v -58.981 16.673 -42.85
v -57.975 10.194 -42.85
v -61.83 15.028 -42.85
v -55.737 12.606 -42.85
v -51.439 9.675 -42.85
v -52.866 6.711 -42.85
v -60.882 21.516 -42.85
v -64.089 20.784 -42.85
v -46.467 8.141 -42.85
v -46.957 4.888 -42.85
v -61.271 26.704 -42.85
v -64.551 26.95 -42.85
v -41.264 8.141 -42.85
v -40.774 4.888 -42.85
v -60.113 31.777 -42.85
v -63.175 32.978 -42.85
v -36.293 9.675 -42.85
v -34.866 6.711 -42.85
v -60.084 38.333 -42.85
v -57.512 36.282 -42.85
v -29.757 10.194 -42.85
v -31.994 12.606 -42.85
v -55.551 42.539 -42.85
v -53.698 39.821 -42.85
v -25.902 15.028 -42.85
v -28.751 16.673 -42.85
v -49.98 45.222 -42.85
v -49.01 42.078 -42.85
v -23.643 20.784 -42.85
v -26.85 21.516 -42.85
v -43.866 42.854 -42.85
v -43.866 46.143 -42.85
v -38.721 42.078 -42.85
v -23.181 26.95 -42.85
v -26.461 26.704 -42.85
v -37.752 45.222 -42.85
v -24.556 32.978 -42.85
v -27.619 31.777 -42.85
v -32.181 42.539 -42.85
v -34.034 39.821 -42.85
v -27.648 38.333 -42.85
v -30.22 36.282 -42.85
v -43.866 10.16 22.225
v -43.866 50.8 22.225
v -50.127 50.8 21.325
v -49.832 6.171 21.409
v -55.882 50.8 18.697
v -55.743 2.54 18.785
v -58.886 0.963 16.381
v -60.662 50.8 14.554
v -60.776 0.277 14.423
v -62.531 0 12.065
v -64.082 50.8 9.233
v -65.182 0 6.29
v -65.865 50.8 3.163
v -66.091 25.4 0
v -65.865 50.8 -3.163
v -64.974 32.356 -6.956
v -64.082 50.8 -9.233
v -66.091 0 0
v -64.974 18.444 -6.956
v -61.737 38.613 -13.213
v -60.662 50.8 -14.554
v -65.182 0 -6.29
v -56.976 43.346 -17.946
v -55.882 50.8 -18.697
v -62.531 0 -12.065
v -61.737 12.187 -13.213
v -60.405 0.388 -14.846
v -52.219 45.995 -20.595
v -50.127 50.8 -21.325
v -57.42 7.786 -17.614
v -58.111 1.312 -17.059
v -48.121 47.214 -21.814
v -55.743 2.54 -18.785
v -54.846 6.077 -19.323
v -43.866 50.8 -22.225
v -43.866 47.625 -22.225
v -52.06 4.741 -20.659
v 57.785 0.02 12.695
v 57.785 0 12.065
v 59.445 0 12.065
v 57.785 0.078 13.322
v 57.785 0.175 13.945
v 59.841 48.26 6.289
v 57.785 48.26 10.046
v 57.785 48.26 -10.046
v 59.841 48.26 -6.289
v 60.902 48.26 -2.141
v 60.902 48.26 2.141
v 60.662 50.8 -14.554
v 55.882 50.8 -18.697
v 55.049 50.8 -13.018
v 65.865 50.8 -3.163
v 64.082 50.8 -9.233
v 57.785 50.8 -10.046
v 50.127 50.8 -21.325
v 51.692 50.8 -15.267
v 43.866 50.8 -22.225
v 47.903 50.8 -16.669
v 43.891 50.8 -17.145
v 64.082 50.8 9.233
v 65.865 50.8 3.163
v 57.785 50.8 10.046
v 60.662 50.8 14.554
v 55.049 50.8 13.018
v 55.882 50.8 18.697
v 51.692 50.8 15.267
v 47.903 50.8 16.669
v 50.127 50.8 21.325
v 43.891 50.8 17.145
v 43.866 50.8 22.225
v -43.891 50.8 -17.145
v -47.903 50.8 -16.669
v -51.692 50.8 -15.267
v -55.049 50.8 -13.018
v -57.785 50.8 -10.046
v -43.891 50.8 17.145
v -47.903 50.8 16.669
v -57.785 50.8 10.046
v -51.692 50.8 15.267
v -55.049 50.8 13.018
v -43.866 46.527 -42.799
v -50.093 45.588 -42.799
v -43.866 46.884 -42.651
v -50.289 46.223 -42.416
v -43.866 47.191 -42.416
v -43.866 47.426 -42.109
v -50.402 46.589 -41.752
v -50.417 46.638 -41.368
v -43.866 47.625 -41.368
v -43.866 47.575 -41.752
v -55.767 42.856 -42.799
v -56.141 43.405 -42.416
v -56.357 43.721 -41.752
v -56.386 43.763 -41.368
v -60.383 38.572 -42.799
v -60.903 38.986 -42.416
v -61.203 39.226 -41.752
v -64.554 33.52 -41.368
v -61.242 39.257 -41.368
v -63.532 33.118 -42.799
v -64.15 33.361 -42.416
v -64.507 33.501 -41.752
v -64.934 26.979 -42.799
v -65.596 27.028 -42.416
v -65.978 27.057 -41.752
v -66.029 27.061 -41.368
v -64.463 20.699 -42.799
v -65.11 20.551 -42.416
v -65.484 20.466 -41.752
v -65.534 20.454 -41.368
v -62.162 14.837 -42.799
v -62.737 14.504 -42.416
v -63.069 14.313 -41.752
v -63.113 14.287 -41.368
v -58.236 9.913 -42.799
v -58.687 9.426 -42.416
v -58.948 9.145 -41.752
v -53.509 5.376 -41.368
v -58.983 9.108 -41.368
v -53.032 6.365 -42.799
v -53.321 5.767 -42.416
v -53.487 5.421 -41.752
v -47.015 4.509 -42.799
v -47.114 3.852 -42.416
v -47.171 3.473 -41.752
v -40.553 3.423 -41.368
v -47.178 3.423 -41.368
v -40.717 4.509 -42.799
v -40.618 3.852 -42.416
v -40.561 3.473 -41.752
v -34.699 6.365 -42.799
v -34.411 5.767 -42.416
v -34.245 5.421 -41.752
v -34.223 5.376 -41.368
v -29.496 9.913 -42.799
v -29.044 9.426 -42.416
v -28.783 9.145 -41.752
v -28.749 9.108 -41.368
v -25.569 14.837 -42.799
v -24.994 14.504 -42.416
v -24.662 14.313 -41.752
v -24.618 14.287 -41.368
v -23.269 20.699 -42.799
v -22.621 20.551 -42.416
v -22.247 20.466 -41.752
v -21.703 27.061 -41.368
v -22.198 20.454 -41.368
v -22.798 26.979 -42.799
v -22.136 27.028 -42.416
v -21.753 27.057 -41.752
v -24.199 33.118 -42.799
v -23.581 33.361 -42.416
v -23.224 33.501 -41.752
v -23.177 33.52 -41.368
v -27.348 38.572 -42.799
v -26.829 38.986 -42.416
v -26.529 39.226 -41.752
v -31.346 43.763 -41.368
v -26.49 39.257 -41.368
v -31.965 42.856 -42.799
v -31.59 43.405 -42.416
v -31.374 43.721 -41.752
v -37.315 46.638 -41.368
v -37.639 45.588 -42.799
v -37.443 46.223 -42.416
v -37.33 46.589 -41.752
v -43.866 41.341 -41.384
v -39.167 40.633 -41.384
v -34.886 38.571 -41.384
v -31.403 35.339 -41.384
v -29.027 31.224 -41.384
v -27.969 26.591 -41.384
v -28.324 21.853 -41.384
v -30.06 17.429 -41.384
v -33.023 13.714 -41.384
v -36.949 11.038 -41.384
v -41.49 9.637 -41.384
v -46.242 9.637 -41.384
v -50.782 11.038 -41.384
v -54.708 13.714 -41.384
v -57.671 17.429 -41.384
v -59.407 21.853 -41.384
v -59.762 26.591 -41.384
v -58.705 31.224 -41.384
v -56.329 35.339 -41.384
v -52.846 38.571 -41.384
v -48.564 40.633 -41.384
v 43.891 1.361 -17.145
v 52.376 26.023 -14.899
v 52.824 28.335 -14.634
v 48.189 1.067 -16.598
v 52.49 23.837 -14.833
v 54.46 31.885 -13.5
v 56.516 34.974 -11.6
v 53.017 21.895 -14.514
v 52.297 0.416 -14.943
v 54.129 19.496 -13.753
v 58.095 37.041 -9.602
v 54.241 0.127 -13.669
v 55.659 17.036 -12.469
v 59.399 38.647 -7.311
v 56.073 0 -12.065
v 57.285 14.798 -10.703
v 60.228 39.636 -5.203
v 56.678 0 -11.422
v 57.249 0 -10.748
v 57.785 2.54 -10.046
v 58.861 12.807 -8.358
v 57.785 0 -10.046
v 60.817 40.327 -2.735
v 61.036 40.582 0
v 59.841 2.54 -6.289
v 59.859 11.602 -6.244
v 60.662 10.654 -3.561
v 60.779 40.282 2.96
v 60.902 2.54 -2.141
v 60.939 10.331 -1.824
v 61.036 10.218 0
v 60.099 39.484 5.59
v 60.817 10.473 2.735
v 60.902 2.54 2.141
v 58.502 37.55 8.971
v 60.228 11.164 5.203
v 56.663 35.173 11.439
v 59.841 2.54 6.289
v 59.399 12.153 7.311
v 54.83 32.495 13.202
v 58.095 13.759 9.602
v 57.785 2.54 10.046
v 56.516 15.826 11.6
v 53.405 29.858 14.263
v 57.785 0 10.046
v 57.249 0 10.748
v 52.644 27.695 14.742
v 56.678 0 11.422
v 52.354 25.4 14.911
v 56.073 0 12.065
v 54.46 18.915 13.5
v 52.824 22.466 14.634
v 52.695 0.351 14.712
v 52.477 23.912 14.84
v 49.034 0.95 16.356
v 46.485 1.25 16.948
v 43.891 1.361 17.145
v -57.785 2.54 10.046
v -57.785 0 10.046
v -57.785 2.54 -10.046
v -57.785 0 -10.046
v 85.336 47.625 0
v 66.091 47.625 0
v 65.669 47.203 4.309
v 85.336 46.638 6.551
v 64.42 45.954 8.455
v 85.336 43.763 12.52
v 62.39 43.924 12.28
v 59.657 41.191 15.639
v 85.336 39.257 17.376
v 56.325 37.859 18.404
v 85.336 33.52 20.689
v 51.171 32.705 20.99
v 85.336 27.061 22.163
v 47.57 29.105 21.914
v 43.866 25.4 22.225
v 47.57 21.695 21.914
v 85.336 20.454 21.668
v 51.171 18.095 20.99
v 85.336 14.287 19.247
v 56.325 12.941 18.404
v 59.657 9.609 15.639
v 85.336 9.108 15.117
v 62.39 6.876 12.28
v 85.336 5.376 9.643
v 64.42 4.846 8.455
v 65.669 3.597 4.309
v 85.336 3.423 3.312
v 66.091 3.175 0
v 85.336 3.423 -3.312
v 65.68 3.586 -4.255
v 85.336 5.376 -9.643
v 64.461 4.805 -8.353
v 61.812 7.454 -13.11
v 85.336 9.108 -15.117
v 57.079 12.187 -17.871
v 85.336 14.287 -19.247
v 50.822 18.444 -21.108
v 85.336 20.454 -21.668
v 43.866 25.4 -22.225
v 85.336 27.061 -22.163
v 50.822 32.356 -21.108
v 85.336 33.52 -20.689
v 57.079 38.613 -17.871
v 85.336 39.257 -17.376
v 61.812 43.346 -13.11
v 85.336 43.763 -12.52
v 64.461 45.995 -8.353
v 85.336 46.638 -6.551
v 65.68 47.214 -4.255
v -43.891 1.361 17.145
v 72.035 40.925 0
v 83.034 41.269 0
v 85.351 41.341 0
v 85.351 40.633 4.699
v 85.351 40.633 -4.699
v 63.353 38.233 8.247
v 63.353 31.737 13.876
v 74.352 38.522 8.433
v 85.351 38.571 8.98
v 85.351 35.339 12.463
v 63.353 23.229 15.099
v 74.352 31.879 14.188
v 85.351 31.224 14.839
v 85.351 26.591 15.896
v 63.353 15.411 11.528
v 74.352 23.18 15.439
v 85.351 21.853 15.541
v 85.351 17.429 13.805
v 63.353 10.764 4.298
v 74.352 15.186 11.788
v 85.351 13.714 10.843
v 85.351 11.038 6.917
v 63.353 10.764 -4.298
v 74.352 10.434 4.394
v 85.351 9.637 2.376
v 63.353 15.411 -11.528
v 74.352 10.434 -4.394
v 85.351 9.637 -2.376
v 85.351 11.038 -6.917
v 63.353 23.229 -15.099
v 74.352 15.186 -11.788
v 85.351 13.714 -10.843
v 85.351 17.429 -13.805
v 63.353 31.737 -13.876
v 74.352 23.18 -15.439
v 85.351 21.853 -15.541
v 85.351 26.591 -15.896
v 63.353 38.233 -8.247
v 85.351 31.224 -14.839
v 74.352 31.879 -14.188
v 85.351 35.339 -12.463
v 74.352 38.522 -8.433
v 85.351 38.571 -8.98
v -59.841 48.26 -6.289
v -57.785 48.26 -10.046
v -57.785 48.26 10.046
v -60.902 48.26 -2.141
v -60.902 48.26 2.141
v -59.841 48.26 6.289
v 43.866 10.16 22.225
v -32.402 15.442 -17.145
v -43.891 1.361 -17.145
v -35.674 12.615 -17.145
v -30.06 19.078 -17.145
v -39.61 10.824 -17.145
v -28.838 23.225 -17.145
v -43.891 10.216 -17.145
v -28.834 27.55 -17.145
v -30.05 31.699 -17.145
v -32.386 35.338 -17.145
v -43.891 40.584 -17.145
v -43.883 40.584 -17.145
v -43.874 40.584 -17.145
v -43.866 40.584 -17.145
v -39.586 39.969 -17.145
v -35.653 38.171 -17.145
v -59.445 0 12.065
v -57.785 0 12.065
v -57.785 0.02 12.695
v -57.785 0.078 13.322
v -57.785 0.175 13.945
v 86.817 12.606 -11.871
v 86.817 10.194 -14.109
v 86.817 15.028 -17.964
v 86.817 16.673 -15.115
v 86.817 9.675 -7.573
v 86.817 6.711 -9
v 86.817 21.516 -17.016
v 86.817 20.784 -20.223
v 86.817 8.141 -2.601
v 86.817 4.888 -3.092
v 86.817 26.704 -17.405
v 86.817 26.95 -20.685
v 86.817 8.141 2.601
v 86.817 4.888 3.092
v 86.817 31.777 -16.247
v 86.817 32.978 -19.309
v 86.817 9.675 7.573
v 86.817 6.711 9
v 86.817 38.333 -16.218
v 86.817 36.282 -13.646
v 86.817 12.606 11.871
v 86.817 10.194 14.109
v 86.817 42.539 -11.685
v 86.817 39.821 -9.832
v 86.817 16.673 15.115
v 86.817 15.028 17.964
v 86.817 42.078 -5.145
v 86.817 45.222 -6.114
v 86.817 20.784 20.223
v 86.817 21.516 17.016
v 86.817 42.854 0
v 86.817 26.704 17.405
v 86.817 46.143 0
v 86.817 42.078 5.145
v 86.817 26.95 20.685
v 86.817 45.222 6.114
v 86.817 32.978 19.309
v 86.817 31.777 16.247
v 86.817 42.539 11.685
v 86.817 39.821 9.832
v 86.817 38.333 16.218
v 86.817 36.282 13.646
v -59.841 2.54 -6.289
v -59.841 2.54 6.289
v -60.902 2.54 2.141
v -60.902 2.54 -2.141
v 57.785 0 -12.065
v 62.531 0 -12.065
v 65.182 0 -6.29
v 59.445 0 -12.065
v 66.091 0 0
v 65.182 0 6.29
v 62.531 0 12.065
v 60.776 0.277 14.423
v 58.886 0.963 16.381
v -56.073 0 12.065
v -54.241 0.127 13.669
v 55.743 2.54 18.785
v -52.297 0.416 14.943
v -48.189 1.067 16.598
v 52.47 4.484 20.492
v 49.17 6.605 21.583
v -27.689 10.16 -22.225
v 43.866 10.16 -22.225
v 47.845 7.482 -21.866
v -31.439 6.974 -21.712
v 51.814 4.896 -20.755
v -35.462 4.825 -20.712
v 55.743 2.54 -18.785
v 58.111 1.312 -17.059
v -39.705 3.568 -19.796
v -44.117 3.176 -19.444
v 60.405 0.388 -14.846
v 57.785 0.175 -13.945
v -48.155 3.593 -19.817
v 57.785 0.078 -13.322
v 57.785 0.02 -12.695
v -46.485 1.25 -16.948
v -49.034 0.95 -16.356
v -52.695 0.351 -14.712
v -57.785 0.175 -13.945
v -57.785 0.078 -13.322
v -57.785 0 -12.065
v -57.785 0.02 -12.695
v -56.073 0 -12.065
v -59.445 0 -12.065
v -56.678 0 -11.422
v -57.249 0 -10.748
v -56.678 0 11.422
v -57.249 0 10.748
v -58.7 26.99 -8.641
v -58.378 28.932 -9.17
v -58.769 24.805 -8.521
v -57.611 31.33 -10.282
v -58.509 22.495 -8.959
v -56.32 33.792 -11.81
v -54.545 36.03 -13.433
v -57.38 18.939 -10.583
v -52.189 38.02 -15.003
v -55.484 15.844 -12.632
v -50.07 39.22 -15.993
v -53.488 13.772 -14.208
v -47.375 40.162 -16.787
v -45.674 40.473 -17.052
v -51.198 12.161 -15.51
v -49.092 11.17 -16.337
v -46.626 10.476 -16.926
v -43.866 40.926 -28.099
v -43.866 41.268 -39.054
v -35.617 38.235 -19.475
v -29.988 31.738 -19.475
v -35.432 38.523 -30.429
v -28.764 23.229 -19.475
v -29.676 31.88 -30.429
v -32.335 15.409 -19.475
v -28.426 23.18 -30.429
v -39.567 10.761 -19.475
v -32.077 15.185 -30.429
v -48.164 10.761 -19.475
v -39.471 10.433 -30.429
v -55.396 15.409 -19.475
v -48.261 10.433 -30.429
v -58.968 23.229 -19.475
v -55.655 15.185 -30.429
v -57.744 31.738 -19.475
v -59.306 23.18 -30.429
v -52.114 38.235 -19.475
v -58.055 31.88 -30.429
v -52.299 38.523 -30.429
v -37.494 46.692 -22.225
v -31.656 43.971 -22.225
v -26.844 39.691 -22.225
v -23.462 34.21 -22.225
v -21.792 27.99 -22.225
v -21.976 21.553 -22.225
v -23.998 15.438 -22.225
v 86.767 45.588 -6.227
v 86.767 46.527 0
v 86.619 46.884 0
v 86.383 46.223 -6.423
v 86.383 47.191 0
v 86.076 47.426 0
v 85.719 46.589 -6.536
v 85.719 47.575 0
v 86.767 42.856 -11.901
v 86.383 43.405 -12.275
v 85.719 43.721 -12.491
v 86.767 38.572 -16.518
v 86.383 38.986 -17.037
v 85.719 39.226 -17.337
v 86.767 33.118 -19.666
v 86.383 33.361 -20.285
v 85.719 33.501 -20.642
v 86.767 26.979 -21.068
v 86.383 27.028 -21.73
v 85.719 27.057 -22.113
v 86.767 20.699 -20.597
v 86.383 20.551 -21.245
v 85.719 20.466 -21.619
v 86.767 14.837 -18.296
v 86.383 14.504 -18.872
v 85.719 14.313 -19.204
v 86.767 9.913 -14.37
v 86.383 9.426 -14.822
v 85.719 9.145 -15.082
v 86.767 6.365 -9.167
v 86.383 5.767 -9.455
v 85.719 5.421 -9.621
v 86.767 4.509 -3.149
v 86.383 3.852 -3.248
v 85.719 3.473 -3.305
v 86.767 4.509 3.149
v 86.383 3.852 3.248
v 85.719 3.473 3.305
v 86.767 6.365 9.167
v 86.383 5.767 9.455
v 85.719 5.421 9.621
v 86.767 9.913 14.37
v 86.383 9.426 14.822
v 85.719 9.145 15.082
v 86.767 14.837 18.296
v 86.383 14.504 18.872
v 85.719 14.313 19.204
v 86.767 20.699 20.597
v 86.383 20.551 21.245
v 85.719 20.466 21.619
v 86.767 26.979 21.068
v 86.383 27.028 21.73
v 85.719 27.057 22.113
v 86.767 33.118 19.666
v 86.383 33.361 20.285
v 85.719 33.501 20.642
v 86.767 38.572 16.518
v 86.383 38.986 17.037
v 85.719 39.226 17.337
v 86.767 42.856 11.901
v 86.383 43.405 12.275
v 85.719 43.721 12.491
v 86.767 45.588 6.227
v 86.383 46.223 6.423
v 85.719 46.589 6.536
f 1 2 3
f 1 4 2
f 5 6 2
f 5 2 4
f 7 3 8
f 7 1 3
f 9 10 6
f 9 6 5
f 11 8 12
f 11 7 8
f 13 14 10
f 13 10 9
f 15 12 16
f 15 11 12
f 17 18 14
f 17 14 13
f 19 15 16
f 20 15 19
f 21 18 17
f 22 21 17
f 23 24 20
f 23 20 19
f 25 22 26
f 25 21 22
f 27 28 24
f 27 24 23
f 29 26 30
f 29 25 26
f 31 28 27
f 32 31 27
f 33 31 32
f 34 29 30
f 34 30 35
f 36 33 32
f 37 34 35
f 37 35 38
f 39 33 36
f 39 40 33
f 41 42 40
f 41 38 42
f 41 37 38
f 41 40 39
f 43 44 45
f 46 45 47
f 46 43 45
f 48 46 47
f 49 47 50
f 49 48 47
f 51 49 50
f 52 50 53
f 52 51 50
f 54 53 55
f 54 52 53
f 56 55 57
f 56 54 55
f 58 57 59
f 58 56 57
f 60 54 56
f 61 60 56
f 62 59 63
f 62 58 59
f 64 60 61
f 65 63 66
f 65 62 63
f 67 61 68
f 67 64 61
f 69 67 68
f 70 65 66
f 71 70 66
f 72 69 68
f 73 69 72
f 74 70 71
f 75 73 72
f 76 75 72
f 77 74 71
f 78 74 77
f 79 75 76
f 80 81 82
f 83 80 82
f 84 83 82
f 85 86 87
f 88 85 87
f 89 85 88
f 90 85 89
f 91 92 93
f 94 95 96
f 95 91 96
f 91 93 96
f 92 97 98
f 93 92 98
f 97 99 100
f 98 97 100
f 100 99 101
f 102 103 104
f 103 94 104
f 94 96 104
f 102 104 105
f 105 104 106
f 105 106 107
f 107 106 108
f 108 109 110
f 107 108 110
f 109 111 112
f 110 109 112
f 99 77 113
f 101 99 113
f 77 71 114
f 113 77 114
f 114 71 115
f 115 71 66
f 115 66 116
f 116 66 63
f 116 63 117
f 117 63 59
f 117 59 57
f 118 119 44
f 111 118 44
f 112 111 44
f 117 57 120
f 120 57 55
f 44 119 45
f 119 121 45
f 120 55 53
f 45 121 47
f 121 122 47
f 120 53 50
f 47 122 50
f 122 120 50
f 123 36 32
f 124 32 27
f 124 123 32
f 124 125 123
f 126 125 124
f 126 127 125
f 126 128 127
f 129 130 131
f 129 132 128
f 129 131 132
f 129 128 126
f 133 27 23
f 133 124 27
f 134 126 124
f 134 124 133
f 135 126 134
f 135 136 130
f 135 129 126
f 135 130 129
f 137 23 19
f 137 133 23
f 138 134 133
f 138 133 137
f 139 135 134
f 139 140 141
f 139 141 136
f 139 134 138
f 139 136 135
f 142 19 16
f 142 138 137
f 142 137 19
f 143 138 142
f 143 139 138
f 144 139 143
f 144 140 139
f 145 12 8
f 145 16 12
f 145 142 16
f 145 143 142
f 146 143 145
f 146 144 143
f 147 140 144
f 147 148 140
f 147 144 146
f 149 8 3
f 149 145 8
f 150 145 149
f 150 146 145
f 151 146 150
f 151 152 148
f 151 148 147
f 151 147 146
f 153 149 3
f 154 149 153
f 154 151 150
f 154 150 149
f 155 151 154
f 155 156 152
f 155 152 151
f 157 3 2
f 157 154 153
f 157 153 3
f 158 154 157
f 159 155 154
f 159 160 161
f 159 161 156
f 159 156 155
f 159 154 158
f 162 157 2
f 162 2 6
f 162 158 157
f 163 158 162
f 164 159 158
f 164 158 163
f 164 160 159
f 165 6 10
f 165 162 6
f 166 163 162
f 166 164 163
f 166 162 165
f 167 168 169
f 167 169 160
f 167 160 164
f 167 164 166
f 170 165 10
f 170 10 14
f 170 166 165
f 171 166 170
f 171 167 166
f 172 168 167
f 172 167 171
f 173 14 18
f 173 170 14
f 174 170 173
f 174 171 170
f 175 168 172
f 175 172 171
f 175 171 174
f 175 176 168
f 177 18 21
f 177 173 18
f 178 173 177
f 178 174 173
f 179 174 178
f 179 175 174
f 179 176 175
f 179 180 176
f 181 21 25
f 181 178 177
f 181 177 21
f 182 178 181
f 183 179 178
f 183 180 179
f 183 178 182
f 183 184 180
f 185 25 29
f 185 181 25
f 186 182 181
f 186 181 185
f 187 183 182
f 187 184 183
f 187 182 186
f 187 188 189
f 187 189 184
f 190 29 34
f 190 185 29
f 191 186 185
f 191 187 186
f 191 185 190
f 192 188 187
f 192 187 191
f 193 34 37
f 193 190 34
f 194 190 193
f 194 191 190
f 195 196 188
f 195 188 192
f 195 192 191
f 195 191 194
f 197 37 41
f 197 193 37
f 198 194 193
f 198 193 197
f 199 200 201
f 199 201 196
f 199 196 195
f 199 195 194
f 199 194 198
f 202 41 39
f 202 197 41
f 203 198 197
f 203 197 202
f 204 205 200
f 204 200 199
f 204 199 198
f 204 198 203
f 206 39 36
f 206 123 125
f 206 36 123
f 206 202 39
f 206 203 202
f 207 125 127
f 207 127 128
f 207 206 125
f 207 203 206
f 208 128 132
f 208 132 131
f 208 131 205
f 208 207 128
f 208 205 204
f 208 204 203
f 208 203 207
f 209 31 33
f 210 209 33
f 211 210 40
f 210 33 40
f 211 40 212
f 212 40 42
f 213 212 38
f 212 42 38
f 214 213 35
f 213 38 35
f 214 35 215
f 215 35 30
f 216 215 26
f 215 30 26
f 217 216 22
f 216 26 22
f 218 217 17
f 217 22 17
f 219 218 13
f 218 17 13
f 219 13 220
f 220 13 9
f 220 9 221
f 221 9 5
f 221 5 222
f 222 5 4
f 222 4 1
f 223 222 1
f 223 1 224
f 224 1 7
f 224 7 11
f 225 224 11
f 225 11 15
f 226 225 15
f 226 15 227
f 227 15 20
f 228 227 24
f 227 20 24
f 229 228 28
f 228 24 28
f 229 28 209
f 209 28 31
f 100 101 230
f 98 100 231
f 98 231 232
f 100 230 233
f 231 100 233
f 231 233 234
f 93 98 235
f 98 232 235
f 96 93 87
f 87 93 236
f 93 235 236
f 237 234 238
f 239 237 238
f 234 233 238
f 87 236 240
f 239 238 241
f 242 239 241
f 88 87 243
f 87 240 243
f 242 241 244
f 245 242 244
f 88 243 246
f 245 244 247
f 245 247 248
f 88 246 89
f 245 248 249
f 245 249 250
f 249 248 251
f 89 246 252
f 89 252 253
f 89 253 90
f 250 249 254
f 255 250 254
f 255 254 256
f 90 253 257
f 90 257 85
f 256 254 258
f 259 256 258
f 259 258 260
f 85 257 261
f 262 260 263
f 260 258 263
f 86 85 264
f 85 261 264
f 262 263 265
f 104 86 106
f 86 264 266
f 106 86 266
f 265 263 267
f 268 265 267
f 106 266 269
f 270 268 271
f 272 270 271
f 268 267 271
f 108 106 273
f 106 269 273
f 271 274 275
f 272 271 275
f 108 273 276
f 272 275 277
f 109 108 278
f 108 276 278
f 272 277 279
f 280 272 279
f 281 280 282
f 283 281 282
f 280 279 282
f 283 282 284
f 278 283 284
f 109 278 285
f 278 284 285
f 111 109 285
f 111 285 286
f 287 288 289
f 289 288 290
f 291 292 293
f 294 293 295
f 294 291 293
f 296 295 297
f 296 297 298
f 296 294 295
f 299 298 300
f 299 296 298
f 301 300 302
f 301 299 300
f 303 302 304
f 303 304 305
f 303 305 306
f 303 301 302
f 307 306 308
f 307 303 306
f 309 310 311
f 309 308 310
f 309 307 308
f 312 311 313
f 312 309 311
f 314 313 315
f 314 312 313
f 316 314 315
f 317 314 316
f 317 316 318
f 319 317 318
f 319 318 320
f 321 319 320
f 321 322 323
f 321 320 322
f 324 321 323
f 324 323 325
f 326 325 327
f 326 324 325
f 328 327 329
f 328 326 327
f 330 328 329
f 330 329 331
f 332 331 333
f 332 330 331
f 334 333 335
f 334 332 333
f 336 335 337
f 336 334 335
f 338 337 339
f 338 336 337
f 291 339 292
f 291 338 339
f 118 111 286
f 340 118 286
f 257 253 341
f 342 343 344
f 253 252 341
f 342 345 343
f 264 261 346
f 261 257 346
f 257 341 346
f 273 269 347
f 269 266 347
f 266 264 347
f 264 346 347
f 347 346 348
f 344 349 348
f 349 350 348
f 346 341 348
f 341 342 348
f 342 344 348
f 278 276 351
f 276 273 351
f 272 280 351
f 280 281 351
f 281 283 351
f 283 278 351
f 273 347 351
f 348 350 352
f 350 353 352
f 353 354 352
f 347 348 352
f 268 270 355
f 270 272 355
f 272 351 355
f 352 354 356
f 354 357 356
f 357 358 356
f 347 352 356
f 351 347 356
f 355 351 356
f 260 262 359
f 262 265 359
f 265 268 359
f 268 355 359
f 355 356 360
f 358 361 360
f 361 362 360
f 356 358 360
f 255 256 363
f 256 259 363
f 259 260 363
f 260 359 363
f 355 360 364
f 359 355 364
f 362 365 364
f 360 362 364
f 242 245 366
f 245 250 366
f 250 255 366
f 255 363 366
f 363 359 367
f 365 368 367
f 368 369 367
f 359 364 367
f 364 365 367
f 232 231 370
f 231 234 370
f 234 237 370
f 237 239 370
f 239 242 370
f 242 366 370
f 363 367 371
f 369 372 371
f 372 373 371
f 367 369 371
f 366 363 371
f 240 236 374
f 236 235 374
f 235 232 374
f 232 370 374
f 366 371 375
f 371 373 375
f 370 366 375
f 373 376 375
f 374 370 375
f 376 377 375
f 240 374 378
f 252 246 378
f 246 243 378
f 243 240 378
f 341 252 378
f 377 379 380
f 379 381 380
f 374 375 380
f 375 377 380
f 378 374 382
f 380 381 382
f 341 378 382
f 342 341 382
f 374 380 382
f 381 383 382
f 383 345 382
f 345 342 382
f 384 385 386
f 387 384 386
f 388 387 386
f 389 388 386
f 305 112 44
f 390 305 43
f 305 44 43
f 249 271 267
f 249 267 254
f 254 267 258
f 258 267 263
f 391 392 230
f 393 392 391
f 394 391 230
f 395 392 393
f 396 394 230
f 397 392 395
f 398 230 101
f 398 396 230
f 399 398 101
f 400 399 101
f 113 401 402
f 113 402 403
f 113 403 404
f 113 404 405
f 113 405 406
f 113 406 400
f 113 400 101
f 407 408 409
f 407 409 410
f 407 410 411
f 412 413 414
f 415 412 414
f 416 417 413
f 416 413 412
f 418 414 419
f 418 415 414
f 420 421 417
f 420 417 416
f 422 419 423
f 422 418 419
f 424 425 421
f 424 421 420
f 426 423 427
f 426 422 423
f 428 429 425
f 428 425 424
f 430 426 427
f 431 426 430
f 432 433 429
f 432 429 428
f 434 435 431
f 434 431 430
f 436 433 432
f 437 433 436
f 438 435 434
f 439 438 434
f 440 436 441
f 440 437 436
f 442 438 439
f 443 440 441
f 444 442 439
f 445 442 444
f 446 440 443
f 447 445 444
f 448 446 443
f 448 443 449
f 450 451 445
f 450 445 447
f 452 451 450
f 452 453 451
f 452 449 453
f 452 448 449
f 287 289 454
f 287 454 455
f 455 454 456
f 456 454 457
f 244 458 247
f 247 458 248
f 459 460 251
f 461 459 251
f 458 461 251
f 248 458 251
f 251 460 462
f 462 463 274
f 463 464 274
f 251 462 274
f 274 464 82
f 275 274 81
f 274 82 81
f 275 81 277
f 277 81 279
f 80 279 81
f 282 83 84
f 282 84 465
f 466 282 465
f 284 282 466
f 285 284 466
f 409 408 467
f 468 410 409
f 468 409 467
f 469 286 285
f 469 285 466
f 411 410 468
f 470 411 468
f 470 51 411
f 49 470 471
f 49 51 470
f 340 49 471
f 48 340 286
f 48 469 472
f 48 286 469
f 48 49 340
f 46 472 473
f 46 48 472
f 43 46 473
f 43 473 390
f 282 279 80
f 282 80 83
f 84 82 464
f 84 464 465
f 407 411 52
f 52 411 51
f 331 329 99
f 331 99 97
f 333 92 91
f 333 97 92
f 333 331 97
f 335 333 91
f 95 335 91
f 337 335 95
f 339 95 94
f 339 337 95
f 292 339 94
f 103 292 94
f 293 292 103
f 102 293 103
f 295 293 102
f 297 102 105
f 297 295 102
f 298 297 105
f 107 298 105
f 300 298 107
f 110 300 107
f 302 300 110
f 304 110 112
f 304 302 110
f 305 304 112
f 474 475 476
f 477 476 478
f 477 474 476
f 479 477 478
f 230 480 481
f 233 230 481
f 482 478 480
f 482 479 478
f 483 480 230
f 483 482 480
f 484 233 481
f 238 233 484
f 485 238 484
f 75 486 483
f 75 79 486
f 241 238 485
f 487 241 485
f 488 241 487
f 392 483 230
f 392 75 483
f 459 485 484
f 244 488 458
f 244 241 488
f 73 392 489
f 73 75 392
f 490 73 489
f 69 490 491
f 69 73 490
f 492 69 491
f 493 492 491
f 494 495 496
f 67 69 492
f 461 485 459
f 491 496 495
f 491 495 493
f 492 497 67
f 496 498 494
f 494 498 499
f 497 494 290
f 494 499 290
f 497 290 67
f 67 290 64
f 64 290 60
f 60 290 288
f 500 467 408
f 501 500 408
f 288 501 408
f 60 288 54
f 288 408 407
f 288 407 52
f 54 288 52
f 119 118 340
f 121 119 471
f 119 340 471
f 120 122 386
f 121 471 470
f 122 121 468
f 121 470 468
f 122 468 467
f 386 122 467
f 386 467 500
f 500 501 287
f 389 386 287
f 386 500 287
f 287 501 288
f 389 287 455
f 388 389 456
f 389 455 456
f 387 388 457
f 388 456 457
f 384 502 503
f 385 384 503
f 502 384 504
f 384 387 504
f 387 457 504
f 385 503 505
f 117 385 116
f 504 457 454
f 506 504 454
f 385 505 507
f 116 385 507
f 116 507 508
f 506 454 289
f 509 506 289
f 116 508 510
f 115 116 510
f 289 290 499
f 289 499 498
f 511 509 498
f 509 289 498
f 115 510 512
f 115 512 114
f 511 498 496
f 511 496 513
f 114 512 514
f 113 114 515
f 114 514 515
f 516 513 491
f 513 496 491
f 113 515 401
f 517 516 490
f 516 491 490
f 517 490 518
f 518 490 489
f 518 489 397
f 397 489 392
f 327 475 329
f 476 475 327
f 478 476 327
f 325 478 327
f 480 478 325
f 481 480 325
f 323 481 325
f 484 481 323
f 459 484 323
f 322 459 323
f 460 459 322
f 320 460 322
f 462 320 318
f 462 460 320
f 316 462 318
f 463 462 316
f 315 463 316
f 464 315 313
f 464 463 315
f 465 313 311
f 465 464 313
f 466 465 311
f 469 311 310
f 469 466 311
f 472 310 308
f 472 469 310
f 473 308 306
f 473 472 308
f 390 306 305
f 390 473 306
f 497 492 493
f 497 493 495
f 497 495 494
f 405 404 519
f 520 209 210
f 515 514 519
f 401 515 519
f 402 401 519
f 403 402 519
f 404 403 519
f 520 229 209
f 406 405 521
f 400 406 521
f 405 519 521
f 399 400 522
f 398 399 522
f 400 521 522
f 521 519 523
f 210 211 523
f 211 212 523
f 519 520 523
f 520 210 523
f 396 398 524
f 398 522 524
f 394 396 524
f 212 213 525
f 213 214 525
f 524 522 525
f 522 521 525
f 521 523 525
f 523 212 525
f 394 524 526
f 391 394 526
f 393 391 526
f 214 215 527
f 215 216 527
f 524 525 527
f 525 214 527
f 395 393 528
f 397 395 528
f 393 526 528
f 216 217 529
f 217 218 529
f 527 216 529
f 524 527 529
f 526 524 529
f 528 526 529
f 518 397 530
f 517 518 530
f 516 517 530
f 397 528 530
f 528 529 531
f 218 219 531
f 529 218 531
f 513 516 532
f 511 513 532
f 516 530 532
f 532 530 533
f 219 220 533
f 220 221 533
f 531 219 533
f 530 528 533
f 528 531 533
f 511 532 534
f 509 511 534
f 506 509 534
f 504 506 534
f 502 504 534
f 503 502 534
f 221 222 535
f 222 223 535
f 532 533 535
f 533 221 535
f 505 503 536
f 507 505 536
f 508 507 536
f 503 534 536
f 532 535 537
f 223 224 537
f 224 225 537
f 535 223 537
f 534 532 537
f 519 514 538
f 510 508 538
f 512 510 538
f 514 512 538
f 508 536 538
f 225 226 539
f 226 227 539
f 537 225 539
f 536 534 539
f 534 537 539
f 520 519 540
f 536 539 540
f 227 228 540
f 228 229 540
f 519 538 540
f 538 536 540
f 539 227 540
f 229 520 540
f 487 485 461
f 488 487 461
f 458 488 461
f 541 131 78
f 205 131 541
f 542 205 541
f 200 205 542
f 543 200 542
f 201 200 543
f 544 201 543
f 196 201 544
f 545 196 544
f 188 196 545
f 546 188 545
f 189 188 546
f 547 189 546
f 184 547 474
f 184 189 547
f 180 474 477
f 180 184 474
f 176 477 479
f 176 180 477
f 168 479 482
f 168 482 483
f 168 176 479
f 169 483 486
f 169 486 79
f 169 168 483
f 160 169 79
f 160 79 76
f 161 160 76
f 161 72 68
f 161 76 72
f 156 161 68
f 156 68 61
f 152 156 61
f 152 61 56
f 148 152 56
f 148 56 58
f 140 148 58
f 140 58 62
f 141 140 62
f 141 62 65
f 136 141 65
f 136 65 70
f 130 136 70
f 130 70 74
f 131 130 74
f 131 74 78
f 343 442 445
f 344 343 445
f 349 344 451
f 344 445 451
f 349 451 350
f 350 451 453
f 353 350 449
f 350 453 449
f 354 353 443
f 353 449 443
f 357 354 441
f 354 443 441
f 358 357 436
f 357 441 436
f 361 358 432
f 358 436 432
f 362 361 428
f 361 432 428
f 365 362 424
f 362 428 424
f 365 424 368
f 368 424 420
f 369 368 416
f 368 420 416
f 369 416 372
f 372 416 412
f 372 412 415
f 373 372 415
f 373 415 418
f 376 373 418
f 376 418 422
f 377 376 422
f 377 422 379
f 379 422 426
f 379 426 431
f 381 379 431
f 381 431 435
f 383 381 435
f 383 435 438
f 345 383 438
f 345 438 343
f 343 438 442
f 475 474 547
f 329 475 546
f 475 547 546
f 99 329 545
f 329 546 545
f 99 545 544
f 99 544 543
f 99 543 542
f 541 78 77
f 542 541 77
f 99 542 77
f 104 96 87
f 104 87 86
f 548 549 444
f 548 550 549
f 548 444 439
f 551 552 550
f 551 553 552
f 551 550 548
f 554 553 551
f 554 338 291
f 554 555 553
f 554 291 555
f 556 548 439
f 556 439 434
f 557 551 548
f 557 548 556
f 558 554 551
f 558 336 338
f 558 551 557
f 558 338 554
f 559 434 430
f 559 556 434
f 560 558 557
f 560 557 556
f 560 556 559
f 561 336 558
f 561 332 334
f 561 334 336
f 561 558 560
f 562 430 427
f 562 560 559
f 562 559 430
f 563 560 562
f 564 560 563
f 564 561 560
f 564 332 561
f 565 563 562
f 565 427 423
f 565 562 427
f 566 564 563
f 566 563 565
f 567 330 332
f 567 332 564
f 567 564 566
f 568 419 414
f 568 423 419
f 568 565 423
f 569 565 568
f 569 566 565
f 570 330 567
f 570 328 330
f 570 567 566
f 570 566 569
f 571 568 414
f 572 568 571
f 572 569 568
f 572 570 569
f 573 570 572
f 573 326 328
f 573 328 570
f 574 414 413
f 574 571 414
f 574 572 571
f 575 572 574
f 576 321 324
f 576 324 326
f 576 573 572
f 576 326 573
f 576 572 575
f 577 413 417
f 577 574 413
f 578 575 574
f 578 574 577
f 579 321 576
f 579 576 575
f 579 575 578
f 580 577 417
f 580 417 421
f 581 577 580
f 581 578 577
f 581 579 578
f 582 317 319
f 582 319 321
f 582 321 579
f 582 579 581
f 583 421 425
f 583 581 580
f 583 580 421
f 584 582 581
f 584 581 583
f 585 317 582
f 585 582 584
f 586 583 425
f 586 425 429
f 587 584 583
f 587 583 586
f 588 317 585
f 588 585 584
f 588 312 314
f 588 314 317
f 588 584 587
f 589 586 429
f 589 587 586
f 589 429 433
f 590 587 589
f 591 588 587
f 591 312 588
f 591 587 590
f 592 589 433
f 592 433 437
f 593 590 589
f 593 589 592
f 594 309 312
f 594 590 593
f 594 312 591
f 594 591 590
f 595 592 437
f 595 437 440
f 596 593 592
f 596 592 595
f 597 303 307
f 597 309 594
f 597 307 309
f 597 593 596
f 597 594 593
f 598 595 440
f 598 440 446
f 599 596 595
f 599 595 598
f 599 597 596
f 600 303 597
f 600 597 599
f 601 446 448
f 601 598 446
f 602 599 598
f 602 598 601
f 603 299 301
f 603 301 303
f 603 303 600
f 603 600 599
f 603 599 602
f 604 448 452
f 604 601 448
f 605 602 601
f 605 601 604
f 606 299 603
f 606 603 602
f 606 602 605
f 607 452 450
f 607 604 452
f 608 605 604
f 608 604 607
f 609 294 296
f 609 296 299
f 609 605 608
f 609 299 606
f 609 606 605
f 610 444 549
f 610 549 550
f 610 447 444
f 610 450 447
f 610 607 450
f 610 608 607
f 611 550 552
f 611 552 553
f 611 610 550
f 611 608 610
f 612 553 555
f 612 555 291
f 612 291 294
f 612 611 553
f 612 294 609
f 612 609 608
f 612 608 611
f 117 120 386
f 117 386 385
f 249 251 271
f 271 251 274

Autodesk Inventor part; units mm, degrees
ref_plane "YZ Plane" through (0, 0, 0) normal (1, 0, 0) x (0, 1, 0)
ref_plane "XZ Plane" through (0, 0, 0) normal (0, 1, 0) x (-1, 0, 0)
ref_plane "XY Plane" through (0, 0, 0) normal (0, 0, 1) x (1, 0, 0)
sketch "Sketch_1" plane through (0, 0, 0) normal (1, 0, 0) x (0, 1, 0)
  line L0 (50.8, 22.225) -> (10.16, 22.225)
  arc A0 (10.16, 22.225) -> (0, 12.065) centre (10.16, 12.065) ccw
  line L1 (0, 12.065) -> (0, -12.065)
  arc A1 (0, -12.065) -> (10.16, -22.225) centre (10.16, -12.065) ccw
  line L2 (10.16, -22.225) -> (50.8, -22.225)
  line L3 (50.8, -22.225) -> (50.8, 22.225)
extrude "Extrusion1" add sketch "Sketch_1" along normal mid plane 132.1816
sketch "Sketch_10" plane through (0, 0, 0) normal (0, 1, 0) x (-1, 0, 0)
  circle A0 centre (0, 0) radius 132.1816
  arc A1 (43.8658, -22.225) -> (43.8658, 22.225) centre (43.8658, 0) ccw
  line L0 (43.8658, 22.225) -> (-43.8658, 22.225)
  arc A2 (-43.8658, 22.225) -> (-43.8658, -22.225) centre (-43.8658, 0) ccw
  line L1 (-43.8658, -22.225) -> (43.8658, -22.225)
extrude "Extrusion2" cut sketch "Sketch_10" along normal blind 50.8
sketch "Sketch_7" plane through (0, 0, 0) normal (0, 0, 1) x (1, 0, 0)
  line L0 (86.8172, 25.4) -> (10.3632, 25.4)
  line L1 (10.3632, 25.4) -> (10.3632, 46.1433)
  arc A0 (11.8449, 47.625) -> (10.3632, 46.1433) centre (11.8449, 46.1433) ccw
  line L2 (11.8449, 47.625) -> (85.3355, 47.625)
  arc A1 (86.8172, 46.1433) -> (85.3355, 47.625) centre (85.3355, 46.1433) ccw
  line L3 (86.8172, 46.1433) -> (86.8172, 25.4)
  line L4 (86.8172, 25.4) -> (10.3632, 25.4)
revolve "Revolution1" add sketch "Sketch_7" angle 360 about axis through (86.8172, 25.4, 0) along (1, 0, 0)
sketch "Sketch_14" plane through (-43.8658, 0, 0) normal (1, 0, 0) x (0, 0, -1)
  line L0 (42.8498, 25.4) -> (0, 25.4)
  line L1 (0, 25.4) -> (0, 47.625)
  line L2 (0, 47.625) -> (41.3681, 47.625)
  arc A0 (42.8498, 46.1433) -> (41.3681, 47.625) centre (41.3681, 46.1433) ccw
  line L3 (42.8498, 46.1433) -> (42.8498, 25.4)
  line L4 (42.8498, 25.4) -> (0, 25.4)
revolve "Revolution2" add sketch "Sketch_14" angle 360 about axis through (-43.8658, 25.4, -42.8498) along (0, 0, -1)
sketch "Sketch_15" plane through (0, 0, 0) normal (1, 0, 0) x (0, 1, 0)
  line L0 (50.8, 17.145) -> (0, 17.145)
  arc A0 (0, 17.145) -> (-7.62, 9.525) centre (0, 9.525) ccw
  line L1 (-7.62, 9.525) -> (-7.62, -9.525)
  arc A1 (-7.62, -9.525) -> (0, -17.145) centre (0, -9.525) ccw
  line L2 (0, -17.145) -> (50.8, -17.145)
  line L3 (50.8, -17.145) -> (50.8, 17.145)
sketch "Sketch_17" plane through (0, 0, 0) normal (0, 0, 1) x (1, 0, 0)
  line L0 (-43.8912, -7.62) -> (-43.8912, 50.8)
  line L1 (-43.8912, 50.8) -> (-26.7462, 50.8)
  line L2 (-26.7462, 50.8) -> (-26.7462, 0)
  arc A0 (-34.3662, -7.62) -> (-26.7462, 0) centre (-34.3662, 0) ccw
  line L3 (-34.3662, -7.62) -> (-43.8912, -7.62)
  line L4 (-43.8912, -7.62) -> (-43.8912, 50.8)
revolve "Revolution3" cut sketch "Sketch_17" angle 360 about axis through (-43.8912, -7.62, 0) along (0, -1, 0)
extrude "Extrusion3" cut sketch "Sketch_15" along normal mid plane 87.7824
sketch "Sketch_3" plane through (0, 0, 0) normal (0, 0, 1) x (1, 0, 0)
  line L0 (43.8912, -7.62) -> (43.8912, 50.8)
  line L1 (43.8912, 50.8) -> (61.0362, 50.8)
  line L2 (61.0362, 50.8) -> (61.0362, 0)
  arc A0 (53.4162, -7.62) -> (61.0362, 0) centre (53.4162, 0) ccw
  line L3 (53.4162, -7.62) -> (43.8912, -7.62)
  line L4 (43.8912, -7.62) -> (43.8912, 50.8)
revolve "Revolution4" cut sketch "Sketch_3" angle 360 about axis through (43.8912, -7.62, 0) along (0, -1, 0)
sketch "Sketch_8" plane through (0, 50.8, 0) normal (0, 1, 0) x (1, 0, 0)
  arc A0 (57.785, -13.9449) -> (57.785, 13.9449) centre (43.8912, 0) ccw
  line L0 (57.785, 13.9449) -> (57.785, -13.9449)
extrude "Extrusion4" add sketch "Sketch_8" against normal blind 2.54
sketch "Sketch_9" plane through (0, 50.8, 0) normal (0, 1, 0) x (1, 0, 0)
  arc A0 (-57.785, 13.9449) -> (-57.785, -13.9449) centre (-43.8912, 0) ccw
  line L0 (-57.785, -13.9449) -> (-57.785, 13.9449)
extrude "Extrusion5" add sketch "Sketch_9" against normal blind 2.54
sketch "Sketch_4" plane through (0, 0, 0) normal (0, 1, 0) x (-1, 0, 0)
  arc A0 (-57.785, 13.9449) -> (-57.785, -13.9449) centre (-43.8912, 0) ccw
  line L0 (-57.785, -13.9449) -> (-57.785, 13.9449)
extrude "Extrusion6" add sketch "Sketch_4" along normal blind 2.54
sketch "Sketch_5" plane through (0, 0, 0) normal (0, 1, 0) x (-1, 0, 0)
  arc A0 (57.785, -13.9449) -> (57.785, 13.9449) centre (43.8912, 0) ccw
  line L0 (57.785, 13.9449) -> (57.785, -13.9449)
extrude "Extrusion7" add sketch "Sketch_5" along normal blind 2.54
sketch "Sketch_6" plane through (0, 0, 0) normal (1, 0, 0) x (0, 1, 0)
  line L0 (2.54, 22.225) -> (-50.8, 22.225)
  line L1 (-50.8, 22.225) -> (-50.8, -22.225)
  line L2 (-50.8, -22.225) -> (2.54, -22.225)
  line L3 (2.54, -22.225) -> (2.54, -18.7852)
  arc A0 (0, -12.065) -> (2.54, -18.7852) centre (10.16, -12.065) ccw
  line L4 (0, -12.065) -> (0, 12.065)
  arc A1 (2.54, 18.7852) -> (0, 12.065) centre (10.16, 12.065) ccw
  line L5 (2.54, 18.7852) -> (2.54, 22.225)
extrude "Extrusion8" cut sketch "Sketch_6" along normal mid plane 132.1816
sketch "Sketch_11" plane through (0, 0, 0) normal (0, 0, 1) x (1, 0, 0)
  line L0 (86.8172, 25.4) -> (10.3632, 25.4)
  line L1 (10.3632, 25.4) -> (10.3632, 38.9999)
  line L2 (10.3632, 38.9999) -> (85.3511, 41.341)
  line L3 (85.3511, 41.341) -> (86.8172, 42.8536)
  line L4 (86.8172, 42.8536) -> (86.8172, 25.4)
  line L5 (86.8172, 25.4) -> (10.3632, 25.4)
revolve "Revolution5" cut sketch "Sketch_11" angle 360 about axis through (86.8172, 25.4, 0) along (1, 0, 0)
thread "Thread1" size "1" designation "1 - 11.5 NPT" standard "NPT" length 23.876 offset 10.5764
sketch "Sketch_12" plane through (-43.8658, 0, 0) normal (1, 0, 0) x (0, 0, -1)
  line L0 (42.8498, 25.4) -> (0, 25.4)
  line L1 (0, 25.4) -> (0, 40.049)
  line L2 (0, 40.049) -> (41.3837, 41.341)
  line L3 (41.3837, 41.341) -> (42.8498, 42.8536)
  line L4 (42.8498, 42.8536) -> (42.8498, 25.4)
  line L5 (42.8498, 25.4) -> (0, 25.4)
revolve "Revolution6" cut sketch "Sketch_12" angle 360 about axis through (-43.8658, 25.4, -42.8498) along (0, 0, -1)
thread "Thread2" size "1" designation "1 - 11.5 NPT" standard "NPT" length 22.4208
properties part number "L37-TB"
